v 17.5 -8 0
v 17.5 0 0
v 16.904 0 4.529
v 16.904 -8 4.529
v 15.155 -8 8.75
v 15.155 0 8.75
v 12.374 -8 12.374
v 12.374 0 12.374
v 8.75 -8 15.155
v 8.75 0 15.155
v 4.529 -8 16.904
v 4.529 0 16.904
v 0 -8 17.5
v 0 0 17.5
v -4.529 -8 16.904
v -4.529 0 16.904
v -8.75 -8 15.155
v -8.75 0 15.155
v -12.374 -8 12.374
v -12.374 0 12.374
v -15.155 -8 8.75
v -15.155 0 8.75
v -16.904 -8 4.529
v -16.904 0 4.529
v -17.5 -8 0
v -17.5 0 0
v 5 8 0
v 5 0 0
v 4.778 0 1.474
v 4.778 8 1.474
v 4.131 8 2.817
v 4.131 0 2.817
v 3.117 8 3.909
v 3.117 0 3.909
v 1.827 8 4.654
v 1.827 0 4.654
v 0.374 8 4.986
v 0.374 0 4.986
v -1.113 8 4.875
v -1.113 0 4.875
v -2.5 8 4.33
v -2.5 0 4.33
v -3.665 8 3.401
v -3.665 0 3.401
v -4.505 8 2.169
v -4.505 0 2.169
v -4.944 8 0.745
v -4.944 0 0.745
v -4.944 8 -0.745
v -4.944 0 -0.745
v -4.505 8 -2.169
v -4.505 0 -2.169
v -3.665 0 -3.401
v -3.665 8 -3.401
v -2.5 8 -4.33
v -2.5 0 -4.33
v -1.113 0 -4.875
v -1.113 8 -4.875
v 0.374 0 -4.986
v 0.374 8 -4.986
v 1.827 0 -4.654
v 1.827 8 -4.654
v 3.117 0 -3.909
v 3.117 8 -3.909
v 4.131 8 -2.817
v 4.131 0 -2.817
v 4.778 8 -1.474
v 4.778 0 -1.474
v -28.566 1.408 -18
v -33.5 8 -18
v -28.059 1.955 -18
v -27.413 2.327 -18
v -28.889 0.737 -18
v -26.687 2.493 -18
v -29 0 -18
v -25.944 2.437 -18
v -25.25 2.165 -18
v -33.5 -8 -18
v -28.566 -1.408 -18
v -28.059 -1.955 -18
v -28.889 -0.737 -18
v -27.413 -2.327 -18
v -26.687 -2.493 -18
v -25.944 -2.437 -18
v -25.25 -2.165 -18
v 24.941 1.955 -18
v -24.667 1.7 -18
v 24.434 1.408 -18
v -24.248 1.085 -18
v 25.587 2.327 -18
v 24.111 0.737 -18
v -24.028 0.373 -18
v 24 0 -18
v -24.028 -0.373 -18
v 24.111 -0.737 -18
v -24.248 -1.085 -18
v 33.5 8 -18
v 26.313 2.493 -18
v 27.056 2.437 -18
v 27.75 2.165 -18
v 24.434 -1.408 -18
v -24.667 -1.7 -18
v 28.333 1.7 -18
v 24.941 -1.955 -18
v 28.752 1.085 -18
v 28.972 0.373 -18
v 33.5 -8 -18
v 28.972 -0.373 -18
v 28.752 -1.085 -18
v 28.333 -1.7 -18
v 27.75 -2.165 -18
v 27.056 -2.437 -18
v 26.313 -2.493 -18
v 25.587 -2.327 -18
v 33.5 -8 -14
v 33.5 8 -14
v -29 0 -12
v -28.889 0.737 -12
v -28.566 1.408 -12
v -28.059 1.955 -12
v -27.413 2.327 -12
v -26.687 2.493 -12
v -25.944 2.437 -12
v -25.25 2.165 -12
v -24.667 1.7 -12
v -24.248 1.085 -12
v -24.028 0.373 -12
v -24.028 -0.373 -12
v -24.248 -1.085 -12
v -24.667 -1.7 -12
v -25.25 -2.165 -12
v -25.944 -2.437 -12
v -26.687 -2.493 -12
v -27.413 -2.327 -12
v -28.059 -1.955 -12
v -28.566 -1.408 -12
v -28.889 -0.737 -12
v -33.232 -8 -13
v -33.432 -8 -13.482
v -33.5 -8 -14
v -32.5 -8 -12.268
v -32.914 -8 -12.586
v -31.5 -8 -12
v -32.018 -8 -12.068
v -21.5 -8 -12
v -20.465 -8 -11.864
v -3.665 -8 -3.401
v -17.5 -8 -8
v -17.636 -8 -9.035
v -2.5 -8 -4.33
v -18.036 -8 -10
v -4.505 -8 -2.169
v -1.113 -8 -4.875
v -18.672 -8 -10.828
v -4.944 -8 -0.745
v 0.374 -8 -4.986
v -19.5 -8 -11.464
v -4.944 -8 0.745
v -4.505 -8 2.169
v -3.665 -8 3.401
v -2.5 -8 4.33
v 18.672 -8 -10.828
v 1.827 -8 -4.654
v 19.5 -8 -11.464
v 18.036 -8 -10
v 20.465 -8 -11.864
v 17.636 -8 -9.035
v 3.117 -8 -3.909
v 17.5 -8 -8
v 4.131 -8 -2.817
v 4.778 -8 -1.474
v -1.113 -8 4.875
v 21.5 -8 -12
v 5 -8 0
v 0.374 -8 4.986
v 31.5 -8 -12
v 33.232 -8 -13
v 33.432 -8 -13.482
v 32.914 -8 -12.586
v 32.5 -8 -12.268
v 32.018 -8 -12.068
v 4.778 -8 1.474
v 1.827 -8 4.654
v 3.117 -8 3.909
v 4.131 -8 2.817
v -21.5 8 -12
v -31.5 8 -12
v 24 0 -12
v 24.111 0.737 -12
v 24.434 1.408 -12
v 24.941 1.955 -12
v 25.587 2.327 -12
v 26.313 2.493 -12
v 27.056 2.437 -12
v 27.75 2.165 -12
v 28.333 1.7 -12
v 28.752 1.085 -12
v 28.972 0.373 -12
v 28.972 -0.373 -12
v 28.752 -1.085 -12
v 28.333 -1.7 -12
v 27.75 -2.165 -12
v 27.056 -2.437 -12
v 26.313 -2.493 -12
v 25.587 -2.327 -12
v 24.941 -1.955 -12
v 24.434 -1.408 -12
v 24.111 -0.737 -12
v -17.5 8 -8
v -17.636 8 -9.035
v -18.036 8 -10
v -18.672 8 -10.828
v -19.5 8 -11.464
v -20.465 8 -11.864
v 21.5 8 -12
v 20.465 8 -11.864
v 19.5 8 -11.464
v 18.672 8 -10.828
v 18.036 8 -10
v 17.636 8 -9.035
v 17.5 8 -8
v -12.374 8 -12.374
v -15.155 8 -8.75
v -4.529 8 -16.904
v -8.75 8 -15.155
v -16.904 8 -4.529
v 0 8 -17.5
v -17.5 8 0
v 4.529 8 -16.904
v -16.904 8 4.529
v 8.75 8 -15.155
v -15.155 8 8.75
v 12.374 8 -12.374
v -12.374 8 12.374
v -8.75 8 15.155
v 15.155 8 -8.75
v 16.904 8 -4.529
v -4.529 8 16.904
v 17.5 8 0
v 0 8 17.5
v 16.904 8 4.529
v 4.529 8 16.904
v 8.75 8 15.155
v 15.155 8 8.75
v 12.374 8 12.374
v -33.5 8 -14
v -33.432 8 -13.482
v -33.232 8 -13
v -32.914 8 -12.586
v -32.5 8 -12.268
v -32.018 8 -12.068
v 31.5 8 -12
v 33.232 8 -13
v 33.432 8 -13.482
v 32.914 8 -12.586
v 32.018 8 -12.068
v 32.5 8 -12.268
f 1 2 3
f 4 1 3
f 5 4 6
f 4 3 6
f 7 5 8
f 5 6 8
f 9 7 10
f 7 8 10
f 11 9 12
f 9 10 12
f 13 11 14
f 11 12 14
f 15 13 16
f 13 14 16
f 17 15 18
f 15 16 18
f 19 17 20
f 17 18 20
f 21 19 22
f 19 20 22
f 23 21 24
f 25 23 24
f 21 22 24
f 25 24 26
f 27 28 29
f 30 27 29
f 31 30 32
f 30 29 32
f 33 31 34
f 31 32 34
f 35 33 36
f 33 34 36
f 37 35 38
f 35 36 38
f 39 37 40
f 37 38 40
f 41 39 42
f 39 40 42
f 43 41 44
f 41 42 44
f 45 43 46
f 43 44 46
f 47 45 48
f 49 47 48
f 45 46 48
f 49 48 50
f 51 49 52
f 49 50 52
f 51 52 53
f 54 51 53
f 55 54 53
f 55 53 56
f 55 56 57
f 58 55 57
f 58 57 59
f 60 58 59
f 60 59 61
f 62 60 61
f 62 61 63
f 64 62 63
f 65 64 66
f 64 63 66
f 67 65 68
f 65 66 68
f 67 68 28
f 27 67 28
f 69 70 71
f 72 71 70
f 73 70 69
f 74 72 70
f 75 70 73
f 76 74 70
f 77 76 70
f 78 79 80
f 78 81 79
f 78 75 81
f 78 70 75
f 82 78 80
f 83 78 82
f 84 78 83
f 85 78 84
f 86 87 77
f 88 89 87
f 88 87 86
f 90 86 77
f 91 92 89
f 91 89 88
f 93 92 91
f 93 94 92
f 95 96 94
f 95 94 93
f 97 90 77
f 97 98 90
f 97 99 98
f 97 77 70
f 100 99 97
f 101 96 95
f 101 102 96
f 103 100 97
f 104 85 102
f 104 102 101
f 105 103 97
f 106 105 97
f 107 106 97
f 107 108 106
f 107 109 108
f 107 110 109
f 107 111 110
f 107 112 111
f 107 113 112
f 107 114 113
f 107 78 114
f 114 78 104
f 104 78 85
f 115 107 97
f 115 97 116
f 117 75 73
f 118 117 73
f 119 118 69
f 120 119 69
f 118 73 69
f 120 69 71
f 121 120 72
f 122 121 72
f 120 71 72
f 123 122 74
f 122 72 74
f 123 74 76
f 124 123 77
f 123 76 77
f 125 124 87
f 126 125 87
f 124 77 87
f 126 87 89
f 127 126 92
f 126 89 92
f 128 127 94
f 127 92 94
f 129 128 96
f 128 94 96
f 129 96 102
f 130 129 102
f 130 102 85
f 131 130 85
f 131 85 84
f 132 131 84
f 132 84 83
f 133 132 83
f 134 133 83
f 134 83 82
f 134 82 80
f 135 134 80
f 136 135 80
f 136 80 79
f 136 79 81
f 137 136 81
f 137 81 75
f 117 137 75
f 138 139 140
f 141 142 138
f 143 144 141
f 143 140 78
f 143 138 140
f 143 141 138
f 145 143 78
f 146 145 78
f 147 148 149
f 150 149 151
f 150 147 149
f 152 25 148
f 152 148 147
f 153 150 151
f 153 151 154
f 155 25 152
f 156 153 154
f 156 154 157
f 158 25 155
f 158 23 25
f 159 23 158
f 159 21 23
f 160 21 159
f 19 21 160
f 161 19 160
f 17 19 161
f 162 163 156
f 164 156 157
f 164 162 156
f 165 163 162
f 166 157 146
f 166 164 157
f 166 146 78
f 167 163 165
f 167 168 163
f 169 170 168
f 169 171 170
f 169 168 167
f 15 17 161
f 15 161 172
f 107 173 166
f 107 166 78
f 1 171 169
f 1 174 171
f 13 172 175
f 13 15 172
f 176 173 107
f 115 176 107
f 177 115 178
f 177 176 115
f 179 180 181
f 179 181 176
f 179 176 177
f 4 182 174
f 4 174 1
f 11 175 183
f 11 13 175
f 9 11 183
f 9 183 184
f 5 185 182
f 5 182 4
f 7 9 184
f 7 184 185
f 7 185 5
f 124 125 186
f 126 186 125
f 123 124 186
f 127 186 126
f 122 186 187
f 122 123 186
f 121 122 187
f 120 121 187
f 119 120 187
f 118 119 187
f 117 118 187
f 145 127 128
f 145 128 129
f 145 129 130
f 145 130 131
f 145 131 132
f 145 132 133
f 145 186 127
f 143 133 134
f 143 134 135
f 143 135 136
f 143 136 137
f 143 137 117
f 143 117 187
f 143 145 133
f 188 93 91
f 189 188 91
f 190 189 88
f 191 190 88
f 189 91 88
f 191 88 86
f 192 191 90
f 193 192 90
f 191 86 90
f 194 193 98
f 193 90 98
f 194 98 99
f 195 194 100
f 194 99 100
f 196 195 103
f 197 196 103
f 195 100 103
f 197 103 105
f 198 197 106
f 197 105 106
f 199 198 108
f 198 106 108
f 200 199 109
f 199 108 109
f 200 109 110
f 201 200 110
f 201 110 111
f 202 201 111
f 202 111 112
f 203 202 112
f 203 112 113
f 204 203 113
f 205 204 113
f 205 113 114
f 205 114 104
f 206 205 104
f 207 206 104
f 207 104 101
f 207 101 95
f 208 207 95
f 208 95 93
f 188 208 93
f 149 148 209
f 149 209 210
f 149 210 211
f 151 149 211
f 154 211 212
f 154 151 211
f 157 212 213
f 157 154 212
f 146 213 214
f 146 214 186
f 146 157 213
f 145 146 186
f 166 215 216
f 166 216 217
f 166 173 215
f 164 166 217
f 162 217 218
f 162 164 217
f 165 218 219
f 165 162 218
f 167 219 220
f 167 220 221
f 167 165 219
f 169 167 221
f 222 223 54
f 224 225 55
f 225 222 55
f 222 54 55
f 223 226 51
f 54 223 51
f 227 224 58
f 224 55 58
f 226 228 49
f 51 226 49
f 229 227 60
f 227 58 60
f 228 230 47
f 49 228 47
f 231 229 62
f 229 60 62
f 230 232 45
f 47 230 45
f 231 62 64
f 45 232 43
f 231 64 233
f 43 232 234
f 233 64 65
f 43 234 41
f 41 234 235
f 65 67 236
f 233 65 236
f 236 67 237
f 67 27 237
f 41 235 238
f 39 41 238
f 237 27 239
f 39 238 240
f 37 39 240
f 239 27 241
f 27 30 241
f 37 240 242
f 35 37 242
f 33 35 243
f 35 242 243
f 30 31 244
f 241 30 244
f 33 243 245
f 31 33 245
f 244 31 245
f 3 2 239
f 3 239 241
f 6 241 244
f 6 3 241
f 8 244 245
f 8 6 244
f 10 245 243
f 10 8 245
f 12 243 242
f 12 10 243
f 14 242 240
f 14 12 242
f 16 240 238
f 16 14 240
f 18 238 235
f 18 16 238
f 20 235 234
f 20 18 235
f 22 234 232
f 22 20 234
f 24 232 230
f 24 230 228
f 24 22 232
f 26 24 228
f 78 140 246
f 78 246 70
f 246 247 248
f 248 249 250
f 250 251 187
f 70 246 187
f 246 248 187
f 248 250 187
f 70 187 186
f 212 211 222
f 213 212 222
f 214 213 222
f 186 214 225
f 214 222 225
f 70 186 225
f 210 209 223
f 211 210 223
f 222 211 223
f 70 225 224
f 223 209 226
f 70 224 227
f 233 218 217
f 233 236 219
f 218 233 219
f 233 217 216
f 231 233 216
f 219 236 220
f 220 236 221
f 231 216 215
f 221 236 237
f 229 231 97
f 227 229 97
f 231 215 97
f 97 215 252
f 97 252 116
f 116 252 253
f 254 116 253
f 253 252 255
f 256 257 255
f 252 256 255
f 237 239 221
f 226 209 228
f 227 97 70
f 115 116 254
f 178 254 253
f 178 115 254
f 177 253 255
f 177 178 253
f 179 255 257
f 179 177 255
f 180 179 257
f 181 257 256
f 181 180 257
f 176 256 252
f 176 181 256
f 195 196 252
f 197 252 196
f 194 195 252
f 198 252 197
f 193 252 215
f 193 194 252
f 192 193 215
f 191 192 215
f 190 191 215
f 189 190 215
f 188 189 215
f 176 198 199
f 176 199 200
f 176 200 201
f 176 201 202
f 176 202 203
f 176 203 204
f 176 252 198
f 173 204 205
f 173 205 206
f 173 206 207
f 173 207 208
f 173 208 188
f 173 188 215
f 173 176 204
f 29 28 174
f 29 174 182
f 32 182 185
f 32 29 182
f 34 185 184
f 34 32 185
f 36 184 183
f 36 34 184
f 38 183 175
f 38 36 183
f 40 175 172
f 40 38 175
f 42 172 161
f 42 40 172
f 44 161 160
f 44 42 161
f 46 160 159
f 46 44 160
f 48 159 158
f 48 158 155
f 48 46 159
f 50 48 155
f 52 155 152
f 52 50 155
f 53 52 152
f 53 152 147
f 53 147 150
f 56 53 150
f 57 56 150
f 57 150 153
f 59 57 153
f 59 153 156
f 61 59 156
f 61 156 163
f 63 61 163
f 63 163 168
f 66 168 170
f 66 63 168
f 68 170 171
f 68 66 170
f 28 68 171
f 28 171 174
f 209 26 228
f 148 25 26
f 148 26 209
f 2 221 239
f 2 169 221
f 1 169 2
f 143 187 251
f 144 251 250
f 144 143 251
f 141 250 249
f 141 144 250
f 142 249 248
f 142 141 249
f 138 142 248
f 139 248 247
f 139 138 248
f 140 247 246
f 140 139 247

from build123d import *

# Parameters (mm, degrees)
F1_DEPTH = 8
F2_R     = 17.5
F2_R_2   = 5
F3_DEPTH = 8
F4_DEPTH = 8
F6_D     = 5


with BuildPart() as f1:
    # F0 (on Front) → F1 (new body, symmetric)
    with BuildSketch(Plane.XZ):
        with BuildLine():
            Line((17.5, -8), (17.5, 0))
            ThreePointArc((17.5, 0), (0, -17.5), (-17.5, 0))
            Line((-17.5, 0), (-17.5, -8))
            ThreePointArc((-17.5, -8), (-18.671573, -10.828427), (-21.5, -12))
            Line((-21.5, -12), (-31.5, -12))
            ThreePointArc((-31.5, -12), (-32.914214, -12.585786), (-33.5, -14))
            Line((-33.5, -14), (-33.5, -18))
            Line((-33.5, -18), (33.5, -18))
            Line((33.5, -18), (33.5, -14))
            ThreePointArc((33.5, -14), (32.914214, -12.585786), (31.5, -12))
            Line((31.5, -12), (21.5, -12))
            ThreePointArc((21.5, -12), (18.671573, -10.828427), (17.5, -8))
        make_face()
    extrude(amount=F1_DEPTH, both=True)

    # F2 (on Front) → F3 (join)
    with BuildSketch(Plane.XZ):
        Circle(F2_R)
        Circle(F2_R_2, mode=Mode.SUBTRACT)
    extrude(amount=F3_DEPTH)

    # F2 (on Front) → F4 (join)
    with BuildSketch(Plane.XZ):
        Circle(F2_R)
        Circle(F2_R_2, mode=Mode.SUBTRACT)
    extrude(amount=-F4_DEPTH)

    # F6 (through all)
    with Locations(Plane.XY):
        with Locations((-26.5, 0), (26.5, 0)):
            Hole(F6_D / 2)


solid = f1.part
